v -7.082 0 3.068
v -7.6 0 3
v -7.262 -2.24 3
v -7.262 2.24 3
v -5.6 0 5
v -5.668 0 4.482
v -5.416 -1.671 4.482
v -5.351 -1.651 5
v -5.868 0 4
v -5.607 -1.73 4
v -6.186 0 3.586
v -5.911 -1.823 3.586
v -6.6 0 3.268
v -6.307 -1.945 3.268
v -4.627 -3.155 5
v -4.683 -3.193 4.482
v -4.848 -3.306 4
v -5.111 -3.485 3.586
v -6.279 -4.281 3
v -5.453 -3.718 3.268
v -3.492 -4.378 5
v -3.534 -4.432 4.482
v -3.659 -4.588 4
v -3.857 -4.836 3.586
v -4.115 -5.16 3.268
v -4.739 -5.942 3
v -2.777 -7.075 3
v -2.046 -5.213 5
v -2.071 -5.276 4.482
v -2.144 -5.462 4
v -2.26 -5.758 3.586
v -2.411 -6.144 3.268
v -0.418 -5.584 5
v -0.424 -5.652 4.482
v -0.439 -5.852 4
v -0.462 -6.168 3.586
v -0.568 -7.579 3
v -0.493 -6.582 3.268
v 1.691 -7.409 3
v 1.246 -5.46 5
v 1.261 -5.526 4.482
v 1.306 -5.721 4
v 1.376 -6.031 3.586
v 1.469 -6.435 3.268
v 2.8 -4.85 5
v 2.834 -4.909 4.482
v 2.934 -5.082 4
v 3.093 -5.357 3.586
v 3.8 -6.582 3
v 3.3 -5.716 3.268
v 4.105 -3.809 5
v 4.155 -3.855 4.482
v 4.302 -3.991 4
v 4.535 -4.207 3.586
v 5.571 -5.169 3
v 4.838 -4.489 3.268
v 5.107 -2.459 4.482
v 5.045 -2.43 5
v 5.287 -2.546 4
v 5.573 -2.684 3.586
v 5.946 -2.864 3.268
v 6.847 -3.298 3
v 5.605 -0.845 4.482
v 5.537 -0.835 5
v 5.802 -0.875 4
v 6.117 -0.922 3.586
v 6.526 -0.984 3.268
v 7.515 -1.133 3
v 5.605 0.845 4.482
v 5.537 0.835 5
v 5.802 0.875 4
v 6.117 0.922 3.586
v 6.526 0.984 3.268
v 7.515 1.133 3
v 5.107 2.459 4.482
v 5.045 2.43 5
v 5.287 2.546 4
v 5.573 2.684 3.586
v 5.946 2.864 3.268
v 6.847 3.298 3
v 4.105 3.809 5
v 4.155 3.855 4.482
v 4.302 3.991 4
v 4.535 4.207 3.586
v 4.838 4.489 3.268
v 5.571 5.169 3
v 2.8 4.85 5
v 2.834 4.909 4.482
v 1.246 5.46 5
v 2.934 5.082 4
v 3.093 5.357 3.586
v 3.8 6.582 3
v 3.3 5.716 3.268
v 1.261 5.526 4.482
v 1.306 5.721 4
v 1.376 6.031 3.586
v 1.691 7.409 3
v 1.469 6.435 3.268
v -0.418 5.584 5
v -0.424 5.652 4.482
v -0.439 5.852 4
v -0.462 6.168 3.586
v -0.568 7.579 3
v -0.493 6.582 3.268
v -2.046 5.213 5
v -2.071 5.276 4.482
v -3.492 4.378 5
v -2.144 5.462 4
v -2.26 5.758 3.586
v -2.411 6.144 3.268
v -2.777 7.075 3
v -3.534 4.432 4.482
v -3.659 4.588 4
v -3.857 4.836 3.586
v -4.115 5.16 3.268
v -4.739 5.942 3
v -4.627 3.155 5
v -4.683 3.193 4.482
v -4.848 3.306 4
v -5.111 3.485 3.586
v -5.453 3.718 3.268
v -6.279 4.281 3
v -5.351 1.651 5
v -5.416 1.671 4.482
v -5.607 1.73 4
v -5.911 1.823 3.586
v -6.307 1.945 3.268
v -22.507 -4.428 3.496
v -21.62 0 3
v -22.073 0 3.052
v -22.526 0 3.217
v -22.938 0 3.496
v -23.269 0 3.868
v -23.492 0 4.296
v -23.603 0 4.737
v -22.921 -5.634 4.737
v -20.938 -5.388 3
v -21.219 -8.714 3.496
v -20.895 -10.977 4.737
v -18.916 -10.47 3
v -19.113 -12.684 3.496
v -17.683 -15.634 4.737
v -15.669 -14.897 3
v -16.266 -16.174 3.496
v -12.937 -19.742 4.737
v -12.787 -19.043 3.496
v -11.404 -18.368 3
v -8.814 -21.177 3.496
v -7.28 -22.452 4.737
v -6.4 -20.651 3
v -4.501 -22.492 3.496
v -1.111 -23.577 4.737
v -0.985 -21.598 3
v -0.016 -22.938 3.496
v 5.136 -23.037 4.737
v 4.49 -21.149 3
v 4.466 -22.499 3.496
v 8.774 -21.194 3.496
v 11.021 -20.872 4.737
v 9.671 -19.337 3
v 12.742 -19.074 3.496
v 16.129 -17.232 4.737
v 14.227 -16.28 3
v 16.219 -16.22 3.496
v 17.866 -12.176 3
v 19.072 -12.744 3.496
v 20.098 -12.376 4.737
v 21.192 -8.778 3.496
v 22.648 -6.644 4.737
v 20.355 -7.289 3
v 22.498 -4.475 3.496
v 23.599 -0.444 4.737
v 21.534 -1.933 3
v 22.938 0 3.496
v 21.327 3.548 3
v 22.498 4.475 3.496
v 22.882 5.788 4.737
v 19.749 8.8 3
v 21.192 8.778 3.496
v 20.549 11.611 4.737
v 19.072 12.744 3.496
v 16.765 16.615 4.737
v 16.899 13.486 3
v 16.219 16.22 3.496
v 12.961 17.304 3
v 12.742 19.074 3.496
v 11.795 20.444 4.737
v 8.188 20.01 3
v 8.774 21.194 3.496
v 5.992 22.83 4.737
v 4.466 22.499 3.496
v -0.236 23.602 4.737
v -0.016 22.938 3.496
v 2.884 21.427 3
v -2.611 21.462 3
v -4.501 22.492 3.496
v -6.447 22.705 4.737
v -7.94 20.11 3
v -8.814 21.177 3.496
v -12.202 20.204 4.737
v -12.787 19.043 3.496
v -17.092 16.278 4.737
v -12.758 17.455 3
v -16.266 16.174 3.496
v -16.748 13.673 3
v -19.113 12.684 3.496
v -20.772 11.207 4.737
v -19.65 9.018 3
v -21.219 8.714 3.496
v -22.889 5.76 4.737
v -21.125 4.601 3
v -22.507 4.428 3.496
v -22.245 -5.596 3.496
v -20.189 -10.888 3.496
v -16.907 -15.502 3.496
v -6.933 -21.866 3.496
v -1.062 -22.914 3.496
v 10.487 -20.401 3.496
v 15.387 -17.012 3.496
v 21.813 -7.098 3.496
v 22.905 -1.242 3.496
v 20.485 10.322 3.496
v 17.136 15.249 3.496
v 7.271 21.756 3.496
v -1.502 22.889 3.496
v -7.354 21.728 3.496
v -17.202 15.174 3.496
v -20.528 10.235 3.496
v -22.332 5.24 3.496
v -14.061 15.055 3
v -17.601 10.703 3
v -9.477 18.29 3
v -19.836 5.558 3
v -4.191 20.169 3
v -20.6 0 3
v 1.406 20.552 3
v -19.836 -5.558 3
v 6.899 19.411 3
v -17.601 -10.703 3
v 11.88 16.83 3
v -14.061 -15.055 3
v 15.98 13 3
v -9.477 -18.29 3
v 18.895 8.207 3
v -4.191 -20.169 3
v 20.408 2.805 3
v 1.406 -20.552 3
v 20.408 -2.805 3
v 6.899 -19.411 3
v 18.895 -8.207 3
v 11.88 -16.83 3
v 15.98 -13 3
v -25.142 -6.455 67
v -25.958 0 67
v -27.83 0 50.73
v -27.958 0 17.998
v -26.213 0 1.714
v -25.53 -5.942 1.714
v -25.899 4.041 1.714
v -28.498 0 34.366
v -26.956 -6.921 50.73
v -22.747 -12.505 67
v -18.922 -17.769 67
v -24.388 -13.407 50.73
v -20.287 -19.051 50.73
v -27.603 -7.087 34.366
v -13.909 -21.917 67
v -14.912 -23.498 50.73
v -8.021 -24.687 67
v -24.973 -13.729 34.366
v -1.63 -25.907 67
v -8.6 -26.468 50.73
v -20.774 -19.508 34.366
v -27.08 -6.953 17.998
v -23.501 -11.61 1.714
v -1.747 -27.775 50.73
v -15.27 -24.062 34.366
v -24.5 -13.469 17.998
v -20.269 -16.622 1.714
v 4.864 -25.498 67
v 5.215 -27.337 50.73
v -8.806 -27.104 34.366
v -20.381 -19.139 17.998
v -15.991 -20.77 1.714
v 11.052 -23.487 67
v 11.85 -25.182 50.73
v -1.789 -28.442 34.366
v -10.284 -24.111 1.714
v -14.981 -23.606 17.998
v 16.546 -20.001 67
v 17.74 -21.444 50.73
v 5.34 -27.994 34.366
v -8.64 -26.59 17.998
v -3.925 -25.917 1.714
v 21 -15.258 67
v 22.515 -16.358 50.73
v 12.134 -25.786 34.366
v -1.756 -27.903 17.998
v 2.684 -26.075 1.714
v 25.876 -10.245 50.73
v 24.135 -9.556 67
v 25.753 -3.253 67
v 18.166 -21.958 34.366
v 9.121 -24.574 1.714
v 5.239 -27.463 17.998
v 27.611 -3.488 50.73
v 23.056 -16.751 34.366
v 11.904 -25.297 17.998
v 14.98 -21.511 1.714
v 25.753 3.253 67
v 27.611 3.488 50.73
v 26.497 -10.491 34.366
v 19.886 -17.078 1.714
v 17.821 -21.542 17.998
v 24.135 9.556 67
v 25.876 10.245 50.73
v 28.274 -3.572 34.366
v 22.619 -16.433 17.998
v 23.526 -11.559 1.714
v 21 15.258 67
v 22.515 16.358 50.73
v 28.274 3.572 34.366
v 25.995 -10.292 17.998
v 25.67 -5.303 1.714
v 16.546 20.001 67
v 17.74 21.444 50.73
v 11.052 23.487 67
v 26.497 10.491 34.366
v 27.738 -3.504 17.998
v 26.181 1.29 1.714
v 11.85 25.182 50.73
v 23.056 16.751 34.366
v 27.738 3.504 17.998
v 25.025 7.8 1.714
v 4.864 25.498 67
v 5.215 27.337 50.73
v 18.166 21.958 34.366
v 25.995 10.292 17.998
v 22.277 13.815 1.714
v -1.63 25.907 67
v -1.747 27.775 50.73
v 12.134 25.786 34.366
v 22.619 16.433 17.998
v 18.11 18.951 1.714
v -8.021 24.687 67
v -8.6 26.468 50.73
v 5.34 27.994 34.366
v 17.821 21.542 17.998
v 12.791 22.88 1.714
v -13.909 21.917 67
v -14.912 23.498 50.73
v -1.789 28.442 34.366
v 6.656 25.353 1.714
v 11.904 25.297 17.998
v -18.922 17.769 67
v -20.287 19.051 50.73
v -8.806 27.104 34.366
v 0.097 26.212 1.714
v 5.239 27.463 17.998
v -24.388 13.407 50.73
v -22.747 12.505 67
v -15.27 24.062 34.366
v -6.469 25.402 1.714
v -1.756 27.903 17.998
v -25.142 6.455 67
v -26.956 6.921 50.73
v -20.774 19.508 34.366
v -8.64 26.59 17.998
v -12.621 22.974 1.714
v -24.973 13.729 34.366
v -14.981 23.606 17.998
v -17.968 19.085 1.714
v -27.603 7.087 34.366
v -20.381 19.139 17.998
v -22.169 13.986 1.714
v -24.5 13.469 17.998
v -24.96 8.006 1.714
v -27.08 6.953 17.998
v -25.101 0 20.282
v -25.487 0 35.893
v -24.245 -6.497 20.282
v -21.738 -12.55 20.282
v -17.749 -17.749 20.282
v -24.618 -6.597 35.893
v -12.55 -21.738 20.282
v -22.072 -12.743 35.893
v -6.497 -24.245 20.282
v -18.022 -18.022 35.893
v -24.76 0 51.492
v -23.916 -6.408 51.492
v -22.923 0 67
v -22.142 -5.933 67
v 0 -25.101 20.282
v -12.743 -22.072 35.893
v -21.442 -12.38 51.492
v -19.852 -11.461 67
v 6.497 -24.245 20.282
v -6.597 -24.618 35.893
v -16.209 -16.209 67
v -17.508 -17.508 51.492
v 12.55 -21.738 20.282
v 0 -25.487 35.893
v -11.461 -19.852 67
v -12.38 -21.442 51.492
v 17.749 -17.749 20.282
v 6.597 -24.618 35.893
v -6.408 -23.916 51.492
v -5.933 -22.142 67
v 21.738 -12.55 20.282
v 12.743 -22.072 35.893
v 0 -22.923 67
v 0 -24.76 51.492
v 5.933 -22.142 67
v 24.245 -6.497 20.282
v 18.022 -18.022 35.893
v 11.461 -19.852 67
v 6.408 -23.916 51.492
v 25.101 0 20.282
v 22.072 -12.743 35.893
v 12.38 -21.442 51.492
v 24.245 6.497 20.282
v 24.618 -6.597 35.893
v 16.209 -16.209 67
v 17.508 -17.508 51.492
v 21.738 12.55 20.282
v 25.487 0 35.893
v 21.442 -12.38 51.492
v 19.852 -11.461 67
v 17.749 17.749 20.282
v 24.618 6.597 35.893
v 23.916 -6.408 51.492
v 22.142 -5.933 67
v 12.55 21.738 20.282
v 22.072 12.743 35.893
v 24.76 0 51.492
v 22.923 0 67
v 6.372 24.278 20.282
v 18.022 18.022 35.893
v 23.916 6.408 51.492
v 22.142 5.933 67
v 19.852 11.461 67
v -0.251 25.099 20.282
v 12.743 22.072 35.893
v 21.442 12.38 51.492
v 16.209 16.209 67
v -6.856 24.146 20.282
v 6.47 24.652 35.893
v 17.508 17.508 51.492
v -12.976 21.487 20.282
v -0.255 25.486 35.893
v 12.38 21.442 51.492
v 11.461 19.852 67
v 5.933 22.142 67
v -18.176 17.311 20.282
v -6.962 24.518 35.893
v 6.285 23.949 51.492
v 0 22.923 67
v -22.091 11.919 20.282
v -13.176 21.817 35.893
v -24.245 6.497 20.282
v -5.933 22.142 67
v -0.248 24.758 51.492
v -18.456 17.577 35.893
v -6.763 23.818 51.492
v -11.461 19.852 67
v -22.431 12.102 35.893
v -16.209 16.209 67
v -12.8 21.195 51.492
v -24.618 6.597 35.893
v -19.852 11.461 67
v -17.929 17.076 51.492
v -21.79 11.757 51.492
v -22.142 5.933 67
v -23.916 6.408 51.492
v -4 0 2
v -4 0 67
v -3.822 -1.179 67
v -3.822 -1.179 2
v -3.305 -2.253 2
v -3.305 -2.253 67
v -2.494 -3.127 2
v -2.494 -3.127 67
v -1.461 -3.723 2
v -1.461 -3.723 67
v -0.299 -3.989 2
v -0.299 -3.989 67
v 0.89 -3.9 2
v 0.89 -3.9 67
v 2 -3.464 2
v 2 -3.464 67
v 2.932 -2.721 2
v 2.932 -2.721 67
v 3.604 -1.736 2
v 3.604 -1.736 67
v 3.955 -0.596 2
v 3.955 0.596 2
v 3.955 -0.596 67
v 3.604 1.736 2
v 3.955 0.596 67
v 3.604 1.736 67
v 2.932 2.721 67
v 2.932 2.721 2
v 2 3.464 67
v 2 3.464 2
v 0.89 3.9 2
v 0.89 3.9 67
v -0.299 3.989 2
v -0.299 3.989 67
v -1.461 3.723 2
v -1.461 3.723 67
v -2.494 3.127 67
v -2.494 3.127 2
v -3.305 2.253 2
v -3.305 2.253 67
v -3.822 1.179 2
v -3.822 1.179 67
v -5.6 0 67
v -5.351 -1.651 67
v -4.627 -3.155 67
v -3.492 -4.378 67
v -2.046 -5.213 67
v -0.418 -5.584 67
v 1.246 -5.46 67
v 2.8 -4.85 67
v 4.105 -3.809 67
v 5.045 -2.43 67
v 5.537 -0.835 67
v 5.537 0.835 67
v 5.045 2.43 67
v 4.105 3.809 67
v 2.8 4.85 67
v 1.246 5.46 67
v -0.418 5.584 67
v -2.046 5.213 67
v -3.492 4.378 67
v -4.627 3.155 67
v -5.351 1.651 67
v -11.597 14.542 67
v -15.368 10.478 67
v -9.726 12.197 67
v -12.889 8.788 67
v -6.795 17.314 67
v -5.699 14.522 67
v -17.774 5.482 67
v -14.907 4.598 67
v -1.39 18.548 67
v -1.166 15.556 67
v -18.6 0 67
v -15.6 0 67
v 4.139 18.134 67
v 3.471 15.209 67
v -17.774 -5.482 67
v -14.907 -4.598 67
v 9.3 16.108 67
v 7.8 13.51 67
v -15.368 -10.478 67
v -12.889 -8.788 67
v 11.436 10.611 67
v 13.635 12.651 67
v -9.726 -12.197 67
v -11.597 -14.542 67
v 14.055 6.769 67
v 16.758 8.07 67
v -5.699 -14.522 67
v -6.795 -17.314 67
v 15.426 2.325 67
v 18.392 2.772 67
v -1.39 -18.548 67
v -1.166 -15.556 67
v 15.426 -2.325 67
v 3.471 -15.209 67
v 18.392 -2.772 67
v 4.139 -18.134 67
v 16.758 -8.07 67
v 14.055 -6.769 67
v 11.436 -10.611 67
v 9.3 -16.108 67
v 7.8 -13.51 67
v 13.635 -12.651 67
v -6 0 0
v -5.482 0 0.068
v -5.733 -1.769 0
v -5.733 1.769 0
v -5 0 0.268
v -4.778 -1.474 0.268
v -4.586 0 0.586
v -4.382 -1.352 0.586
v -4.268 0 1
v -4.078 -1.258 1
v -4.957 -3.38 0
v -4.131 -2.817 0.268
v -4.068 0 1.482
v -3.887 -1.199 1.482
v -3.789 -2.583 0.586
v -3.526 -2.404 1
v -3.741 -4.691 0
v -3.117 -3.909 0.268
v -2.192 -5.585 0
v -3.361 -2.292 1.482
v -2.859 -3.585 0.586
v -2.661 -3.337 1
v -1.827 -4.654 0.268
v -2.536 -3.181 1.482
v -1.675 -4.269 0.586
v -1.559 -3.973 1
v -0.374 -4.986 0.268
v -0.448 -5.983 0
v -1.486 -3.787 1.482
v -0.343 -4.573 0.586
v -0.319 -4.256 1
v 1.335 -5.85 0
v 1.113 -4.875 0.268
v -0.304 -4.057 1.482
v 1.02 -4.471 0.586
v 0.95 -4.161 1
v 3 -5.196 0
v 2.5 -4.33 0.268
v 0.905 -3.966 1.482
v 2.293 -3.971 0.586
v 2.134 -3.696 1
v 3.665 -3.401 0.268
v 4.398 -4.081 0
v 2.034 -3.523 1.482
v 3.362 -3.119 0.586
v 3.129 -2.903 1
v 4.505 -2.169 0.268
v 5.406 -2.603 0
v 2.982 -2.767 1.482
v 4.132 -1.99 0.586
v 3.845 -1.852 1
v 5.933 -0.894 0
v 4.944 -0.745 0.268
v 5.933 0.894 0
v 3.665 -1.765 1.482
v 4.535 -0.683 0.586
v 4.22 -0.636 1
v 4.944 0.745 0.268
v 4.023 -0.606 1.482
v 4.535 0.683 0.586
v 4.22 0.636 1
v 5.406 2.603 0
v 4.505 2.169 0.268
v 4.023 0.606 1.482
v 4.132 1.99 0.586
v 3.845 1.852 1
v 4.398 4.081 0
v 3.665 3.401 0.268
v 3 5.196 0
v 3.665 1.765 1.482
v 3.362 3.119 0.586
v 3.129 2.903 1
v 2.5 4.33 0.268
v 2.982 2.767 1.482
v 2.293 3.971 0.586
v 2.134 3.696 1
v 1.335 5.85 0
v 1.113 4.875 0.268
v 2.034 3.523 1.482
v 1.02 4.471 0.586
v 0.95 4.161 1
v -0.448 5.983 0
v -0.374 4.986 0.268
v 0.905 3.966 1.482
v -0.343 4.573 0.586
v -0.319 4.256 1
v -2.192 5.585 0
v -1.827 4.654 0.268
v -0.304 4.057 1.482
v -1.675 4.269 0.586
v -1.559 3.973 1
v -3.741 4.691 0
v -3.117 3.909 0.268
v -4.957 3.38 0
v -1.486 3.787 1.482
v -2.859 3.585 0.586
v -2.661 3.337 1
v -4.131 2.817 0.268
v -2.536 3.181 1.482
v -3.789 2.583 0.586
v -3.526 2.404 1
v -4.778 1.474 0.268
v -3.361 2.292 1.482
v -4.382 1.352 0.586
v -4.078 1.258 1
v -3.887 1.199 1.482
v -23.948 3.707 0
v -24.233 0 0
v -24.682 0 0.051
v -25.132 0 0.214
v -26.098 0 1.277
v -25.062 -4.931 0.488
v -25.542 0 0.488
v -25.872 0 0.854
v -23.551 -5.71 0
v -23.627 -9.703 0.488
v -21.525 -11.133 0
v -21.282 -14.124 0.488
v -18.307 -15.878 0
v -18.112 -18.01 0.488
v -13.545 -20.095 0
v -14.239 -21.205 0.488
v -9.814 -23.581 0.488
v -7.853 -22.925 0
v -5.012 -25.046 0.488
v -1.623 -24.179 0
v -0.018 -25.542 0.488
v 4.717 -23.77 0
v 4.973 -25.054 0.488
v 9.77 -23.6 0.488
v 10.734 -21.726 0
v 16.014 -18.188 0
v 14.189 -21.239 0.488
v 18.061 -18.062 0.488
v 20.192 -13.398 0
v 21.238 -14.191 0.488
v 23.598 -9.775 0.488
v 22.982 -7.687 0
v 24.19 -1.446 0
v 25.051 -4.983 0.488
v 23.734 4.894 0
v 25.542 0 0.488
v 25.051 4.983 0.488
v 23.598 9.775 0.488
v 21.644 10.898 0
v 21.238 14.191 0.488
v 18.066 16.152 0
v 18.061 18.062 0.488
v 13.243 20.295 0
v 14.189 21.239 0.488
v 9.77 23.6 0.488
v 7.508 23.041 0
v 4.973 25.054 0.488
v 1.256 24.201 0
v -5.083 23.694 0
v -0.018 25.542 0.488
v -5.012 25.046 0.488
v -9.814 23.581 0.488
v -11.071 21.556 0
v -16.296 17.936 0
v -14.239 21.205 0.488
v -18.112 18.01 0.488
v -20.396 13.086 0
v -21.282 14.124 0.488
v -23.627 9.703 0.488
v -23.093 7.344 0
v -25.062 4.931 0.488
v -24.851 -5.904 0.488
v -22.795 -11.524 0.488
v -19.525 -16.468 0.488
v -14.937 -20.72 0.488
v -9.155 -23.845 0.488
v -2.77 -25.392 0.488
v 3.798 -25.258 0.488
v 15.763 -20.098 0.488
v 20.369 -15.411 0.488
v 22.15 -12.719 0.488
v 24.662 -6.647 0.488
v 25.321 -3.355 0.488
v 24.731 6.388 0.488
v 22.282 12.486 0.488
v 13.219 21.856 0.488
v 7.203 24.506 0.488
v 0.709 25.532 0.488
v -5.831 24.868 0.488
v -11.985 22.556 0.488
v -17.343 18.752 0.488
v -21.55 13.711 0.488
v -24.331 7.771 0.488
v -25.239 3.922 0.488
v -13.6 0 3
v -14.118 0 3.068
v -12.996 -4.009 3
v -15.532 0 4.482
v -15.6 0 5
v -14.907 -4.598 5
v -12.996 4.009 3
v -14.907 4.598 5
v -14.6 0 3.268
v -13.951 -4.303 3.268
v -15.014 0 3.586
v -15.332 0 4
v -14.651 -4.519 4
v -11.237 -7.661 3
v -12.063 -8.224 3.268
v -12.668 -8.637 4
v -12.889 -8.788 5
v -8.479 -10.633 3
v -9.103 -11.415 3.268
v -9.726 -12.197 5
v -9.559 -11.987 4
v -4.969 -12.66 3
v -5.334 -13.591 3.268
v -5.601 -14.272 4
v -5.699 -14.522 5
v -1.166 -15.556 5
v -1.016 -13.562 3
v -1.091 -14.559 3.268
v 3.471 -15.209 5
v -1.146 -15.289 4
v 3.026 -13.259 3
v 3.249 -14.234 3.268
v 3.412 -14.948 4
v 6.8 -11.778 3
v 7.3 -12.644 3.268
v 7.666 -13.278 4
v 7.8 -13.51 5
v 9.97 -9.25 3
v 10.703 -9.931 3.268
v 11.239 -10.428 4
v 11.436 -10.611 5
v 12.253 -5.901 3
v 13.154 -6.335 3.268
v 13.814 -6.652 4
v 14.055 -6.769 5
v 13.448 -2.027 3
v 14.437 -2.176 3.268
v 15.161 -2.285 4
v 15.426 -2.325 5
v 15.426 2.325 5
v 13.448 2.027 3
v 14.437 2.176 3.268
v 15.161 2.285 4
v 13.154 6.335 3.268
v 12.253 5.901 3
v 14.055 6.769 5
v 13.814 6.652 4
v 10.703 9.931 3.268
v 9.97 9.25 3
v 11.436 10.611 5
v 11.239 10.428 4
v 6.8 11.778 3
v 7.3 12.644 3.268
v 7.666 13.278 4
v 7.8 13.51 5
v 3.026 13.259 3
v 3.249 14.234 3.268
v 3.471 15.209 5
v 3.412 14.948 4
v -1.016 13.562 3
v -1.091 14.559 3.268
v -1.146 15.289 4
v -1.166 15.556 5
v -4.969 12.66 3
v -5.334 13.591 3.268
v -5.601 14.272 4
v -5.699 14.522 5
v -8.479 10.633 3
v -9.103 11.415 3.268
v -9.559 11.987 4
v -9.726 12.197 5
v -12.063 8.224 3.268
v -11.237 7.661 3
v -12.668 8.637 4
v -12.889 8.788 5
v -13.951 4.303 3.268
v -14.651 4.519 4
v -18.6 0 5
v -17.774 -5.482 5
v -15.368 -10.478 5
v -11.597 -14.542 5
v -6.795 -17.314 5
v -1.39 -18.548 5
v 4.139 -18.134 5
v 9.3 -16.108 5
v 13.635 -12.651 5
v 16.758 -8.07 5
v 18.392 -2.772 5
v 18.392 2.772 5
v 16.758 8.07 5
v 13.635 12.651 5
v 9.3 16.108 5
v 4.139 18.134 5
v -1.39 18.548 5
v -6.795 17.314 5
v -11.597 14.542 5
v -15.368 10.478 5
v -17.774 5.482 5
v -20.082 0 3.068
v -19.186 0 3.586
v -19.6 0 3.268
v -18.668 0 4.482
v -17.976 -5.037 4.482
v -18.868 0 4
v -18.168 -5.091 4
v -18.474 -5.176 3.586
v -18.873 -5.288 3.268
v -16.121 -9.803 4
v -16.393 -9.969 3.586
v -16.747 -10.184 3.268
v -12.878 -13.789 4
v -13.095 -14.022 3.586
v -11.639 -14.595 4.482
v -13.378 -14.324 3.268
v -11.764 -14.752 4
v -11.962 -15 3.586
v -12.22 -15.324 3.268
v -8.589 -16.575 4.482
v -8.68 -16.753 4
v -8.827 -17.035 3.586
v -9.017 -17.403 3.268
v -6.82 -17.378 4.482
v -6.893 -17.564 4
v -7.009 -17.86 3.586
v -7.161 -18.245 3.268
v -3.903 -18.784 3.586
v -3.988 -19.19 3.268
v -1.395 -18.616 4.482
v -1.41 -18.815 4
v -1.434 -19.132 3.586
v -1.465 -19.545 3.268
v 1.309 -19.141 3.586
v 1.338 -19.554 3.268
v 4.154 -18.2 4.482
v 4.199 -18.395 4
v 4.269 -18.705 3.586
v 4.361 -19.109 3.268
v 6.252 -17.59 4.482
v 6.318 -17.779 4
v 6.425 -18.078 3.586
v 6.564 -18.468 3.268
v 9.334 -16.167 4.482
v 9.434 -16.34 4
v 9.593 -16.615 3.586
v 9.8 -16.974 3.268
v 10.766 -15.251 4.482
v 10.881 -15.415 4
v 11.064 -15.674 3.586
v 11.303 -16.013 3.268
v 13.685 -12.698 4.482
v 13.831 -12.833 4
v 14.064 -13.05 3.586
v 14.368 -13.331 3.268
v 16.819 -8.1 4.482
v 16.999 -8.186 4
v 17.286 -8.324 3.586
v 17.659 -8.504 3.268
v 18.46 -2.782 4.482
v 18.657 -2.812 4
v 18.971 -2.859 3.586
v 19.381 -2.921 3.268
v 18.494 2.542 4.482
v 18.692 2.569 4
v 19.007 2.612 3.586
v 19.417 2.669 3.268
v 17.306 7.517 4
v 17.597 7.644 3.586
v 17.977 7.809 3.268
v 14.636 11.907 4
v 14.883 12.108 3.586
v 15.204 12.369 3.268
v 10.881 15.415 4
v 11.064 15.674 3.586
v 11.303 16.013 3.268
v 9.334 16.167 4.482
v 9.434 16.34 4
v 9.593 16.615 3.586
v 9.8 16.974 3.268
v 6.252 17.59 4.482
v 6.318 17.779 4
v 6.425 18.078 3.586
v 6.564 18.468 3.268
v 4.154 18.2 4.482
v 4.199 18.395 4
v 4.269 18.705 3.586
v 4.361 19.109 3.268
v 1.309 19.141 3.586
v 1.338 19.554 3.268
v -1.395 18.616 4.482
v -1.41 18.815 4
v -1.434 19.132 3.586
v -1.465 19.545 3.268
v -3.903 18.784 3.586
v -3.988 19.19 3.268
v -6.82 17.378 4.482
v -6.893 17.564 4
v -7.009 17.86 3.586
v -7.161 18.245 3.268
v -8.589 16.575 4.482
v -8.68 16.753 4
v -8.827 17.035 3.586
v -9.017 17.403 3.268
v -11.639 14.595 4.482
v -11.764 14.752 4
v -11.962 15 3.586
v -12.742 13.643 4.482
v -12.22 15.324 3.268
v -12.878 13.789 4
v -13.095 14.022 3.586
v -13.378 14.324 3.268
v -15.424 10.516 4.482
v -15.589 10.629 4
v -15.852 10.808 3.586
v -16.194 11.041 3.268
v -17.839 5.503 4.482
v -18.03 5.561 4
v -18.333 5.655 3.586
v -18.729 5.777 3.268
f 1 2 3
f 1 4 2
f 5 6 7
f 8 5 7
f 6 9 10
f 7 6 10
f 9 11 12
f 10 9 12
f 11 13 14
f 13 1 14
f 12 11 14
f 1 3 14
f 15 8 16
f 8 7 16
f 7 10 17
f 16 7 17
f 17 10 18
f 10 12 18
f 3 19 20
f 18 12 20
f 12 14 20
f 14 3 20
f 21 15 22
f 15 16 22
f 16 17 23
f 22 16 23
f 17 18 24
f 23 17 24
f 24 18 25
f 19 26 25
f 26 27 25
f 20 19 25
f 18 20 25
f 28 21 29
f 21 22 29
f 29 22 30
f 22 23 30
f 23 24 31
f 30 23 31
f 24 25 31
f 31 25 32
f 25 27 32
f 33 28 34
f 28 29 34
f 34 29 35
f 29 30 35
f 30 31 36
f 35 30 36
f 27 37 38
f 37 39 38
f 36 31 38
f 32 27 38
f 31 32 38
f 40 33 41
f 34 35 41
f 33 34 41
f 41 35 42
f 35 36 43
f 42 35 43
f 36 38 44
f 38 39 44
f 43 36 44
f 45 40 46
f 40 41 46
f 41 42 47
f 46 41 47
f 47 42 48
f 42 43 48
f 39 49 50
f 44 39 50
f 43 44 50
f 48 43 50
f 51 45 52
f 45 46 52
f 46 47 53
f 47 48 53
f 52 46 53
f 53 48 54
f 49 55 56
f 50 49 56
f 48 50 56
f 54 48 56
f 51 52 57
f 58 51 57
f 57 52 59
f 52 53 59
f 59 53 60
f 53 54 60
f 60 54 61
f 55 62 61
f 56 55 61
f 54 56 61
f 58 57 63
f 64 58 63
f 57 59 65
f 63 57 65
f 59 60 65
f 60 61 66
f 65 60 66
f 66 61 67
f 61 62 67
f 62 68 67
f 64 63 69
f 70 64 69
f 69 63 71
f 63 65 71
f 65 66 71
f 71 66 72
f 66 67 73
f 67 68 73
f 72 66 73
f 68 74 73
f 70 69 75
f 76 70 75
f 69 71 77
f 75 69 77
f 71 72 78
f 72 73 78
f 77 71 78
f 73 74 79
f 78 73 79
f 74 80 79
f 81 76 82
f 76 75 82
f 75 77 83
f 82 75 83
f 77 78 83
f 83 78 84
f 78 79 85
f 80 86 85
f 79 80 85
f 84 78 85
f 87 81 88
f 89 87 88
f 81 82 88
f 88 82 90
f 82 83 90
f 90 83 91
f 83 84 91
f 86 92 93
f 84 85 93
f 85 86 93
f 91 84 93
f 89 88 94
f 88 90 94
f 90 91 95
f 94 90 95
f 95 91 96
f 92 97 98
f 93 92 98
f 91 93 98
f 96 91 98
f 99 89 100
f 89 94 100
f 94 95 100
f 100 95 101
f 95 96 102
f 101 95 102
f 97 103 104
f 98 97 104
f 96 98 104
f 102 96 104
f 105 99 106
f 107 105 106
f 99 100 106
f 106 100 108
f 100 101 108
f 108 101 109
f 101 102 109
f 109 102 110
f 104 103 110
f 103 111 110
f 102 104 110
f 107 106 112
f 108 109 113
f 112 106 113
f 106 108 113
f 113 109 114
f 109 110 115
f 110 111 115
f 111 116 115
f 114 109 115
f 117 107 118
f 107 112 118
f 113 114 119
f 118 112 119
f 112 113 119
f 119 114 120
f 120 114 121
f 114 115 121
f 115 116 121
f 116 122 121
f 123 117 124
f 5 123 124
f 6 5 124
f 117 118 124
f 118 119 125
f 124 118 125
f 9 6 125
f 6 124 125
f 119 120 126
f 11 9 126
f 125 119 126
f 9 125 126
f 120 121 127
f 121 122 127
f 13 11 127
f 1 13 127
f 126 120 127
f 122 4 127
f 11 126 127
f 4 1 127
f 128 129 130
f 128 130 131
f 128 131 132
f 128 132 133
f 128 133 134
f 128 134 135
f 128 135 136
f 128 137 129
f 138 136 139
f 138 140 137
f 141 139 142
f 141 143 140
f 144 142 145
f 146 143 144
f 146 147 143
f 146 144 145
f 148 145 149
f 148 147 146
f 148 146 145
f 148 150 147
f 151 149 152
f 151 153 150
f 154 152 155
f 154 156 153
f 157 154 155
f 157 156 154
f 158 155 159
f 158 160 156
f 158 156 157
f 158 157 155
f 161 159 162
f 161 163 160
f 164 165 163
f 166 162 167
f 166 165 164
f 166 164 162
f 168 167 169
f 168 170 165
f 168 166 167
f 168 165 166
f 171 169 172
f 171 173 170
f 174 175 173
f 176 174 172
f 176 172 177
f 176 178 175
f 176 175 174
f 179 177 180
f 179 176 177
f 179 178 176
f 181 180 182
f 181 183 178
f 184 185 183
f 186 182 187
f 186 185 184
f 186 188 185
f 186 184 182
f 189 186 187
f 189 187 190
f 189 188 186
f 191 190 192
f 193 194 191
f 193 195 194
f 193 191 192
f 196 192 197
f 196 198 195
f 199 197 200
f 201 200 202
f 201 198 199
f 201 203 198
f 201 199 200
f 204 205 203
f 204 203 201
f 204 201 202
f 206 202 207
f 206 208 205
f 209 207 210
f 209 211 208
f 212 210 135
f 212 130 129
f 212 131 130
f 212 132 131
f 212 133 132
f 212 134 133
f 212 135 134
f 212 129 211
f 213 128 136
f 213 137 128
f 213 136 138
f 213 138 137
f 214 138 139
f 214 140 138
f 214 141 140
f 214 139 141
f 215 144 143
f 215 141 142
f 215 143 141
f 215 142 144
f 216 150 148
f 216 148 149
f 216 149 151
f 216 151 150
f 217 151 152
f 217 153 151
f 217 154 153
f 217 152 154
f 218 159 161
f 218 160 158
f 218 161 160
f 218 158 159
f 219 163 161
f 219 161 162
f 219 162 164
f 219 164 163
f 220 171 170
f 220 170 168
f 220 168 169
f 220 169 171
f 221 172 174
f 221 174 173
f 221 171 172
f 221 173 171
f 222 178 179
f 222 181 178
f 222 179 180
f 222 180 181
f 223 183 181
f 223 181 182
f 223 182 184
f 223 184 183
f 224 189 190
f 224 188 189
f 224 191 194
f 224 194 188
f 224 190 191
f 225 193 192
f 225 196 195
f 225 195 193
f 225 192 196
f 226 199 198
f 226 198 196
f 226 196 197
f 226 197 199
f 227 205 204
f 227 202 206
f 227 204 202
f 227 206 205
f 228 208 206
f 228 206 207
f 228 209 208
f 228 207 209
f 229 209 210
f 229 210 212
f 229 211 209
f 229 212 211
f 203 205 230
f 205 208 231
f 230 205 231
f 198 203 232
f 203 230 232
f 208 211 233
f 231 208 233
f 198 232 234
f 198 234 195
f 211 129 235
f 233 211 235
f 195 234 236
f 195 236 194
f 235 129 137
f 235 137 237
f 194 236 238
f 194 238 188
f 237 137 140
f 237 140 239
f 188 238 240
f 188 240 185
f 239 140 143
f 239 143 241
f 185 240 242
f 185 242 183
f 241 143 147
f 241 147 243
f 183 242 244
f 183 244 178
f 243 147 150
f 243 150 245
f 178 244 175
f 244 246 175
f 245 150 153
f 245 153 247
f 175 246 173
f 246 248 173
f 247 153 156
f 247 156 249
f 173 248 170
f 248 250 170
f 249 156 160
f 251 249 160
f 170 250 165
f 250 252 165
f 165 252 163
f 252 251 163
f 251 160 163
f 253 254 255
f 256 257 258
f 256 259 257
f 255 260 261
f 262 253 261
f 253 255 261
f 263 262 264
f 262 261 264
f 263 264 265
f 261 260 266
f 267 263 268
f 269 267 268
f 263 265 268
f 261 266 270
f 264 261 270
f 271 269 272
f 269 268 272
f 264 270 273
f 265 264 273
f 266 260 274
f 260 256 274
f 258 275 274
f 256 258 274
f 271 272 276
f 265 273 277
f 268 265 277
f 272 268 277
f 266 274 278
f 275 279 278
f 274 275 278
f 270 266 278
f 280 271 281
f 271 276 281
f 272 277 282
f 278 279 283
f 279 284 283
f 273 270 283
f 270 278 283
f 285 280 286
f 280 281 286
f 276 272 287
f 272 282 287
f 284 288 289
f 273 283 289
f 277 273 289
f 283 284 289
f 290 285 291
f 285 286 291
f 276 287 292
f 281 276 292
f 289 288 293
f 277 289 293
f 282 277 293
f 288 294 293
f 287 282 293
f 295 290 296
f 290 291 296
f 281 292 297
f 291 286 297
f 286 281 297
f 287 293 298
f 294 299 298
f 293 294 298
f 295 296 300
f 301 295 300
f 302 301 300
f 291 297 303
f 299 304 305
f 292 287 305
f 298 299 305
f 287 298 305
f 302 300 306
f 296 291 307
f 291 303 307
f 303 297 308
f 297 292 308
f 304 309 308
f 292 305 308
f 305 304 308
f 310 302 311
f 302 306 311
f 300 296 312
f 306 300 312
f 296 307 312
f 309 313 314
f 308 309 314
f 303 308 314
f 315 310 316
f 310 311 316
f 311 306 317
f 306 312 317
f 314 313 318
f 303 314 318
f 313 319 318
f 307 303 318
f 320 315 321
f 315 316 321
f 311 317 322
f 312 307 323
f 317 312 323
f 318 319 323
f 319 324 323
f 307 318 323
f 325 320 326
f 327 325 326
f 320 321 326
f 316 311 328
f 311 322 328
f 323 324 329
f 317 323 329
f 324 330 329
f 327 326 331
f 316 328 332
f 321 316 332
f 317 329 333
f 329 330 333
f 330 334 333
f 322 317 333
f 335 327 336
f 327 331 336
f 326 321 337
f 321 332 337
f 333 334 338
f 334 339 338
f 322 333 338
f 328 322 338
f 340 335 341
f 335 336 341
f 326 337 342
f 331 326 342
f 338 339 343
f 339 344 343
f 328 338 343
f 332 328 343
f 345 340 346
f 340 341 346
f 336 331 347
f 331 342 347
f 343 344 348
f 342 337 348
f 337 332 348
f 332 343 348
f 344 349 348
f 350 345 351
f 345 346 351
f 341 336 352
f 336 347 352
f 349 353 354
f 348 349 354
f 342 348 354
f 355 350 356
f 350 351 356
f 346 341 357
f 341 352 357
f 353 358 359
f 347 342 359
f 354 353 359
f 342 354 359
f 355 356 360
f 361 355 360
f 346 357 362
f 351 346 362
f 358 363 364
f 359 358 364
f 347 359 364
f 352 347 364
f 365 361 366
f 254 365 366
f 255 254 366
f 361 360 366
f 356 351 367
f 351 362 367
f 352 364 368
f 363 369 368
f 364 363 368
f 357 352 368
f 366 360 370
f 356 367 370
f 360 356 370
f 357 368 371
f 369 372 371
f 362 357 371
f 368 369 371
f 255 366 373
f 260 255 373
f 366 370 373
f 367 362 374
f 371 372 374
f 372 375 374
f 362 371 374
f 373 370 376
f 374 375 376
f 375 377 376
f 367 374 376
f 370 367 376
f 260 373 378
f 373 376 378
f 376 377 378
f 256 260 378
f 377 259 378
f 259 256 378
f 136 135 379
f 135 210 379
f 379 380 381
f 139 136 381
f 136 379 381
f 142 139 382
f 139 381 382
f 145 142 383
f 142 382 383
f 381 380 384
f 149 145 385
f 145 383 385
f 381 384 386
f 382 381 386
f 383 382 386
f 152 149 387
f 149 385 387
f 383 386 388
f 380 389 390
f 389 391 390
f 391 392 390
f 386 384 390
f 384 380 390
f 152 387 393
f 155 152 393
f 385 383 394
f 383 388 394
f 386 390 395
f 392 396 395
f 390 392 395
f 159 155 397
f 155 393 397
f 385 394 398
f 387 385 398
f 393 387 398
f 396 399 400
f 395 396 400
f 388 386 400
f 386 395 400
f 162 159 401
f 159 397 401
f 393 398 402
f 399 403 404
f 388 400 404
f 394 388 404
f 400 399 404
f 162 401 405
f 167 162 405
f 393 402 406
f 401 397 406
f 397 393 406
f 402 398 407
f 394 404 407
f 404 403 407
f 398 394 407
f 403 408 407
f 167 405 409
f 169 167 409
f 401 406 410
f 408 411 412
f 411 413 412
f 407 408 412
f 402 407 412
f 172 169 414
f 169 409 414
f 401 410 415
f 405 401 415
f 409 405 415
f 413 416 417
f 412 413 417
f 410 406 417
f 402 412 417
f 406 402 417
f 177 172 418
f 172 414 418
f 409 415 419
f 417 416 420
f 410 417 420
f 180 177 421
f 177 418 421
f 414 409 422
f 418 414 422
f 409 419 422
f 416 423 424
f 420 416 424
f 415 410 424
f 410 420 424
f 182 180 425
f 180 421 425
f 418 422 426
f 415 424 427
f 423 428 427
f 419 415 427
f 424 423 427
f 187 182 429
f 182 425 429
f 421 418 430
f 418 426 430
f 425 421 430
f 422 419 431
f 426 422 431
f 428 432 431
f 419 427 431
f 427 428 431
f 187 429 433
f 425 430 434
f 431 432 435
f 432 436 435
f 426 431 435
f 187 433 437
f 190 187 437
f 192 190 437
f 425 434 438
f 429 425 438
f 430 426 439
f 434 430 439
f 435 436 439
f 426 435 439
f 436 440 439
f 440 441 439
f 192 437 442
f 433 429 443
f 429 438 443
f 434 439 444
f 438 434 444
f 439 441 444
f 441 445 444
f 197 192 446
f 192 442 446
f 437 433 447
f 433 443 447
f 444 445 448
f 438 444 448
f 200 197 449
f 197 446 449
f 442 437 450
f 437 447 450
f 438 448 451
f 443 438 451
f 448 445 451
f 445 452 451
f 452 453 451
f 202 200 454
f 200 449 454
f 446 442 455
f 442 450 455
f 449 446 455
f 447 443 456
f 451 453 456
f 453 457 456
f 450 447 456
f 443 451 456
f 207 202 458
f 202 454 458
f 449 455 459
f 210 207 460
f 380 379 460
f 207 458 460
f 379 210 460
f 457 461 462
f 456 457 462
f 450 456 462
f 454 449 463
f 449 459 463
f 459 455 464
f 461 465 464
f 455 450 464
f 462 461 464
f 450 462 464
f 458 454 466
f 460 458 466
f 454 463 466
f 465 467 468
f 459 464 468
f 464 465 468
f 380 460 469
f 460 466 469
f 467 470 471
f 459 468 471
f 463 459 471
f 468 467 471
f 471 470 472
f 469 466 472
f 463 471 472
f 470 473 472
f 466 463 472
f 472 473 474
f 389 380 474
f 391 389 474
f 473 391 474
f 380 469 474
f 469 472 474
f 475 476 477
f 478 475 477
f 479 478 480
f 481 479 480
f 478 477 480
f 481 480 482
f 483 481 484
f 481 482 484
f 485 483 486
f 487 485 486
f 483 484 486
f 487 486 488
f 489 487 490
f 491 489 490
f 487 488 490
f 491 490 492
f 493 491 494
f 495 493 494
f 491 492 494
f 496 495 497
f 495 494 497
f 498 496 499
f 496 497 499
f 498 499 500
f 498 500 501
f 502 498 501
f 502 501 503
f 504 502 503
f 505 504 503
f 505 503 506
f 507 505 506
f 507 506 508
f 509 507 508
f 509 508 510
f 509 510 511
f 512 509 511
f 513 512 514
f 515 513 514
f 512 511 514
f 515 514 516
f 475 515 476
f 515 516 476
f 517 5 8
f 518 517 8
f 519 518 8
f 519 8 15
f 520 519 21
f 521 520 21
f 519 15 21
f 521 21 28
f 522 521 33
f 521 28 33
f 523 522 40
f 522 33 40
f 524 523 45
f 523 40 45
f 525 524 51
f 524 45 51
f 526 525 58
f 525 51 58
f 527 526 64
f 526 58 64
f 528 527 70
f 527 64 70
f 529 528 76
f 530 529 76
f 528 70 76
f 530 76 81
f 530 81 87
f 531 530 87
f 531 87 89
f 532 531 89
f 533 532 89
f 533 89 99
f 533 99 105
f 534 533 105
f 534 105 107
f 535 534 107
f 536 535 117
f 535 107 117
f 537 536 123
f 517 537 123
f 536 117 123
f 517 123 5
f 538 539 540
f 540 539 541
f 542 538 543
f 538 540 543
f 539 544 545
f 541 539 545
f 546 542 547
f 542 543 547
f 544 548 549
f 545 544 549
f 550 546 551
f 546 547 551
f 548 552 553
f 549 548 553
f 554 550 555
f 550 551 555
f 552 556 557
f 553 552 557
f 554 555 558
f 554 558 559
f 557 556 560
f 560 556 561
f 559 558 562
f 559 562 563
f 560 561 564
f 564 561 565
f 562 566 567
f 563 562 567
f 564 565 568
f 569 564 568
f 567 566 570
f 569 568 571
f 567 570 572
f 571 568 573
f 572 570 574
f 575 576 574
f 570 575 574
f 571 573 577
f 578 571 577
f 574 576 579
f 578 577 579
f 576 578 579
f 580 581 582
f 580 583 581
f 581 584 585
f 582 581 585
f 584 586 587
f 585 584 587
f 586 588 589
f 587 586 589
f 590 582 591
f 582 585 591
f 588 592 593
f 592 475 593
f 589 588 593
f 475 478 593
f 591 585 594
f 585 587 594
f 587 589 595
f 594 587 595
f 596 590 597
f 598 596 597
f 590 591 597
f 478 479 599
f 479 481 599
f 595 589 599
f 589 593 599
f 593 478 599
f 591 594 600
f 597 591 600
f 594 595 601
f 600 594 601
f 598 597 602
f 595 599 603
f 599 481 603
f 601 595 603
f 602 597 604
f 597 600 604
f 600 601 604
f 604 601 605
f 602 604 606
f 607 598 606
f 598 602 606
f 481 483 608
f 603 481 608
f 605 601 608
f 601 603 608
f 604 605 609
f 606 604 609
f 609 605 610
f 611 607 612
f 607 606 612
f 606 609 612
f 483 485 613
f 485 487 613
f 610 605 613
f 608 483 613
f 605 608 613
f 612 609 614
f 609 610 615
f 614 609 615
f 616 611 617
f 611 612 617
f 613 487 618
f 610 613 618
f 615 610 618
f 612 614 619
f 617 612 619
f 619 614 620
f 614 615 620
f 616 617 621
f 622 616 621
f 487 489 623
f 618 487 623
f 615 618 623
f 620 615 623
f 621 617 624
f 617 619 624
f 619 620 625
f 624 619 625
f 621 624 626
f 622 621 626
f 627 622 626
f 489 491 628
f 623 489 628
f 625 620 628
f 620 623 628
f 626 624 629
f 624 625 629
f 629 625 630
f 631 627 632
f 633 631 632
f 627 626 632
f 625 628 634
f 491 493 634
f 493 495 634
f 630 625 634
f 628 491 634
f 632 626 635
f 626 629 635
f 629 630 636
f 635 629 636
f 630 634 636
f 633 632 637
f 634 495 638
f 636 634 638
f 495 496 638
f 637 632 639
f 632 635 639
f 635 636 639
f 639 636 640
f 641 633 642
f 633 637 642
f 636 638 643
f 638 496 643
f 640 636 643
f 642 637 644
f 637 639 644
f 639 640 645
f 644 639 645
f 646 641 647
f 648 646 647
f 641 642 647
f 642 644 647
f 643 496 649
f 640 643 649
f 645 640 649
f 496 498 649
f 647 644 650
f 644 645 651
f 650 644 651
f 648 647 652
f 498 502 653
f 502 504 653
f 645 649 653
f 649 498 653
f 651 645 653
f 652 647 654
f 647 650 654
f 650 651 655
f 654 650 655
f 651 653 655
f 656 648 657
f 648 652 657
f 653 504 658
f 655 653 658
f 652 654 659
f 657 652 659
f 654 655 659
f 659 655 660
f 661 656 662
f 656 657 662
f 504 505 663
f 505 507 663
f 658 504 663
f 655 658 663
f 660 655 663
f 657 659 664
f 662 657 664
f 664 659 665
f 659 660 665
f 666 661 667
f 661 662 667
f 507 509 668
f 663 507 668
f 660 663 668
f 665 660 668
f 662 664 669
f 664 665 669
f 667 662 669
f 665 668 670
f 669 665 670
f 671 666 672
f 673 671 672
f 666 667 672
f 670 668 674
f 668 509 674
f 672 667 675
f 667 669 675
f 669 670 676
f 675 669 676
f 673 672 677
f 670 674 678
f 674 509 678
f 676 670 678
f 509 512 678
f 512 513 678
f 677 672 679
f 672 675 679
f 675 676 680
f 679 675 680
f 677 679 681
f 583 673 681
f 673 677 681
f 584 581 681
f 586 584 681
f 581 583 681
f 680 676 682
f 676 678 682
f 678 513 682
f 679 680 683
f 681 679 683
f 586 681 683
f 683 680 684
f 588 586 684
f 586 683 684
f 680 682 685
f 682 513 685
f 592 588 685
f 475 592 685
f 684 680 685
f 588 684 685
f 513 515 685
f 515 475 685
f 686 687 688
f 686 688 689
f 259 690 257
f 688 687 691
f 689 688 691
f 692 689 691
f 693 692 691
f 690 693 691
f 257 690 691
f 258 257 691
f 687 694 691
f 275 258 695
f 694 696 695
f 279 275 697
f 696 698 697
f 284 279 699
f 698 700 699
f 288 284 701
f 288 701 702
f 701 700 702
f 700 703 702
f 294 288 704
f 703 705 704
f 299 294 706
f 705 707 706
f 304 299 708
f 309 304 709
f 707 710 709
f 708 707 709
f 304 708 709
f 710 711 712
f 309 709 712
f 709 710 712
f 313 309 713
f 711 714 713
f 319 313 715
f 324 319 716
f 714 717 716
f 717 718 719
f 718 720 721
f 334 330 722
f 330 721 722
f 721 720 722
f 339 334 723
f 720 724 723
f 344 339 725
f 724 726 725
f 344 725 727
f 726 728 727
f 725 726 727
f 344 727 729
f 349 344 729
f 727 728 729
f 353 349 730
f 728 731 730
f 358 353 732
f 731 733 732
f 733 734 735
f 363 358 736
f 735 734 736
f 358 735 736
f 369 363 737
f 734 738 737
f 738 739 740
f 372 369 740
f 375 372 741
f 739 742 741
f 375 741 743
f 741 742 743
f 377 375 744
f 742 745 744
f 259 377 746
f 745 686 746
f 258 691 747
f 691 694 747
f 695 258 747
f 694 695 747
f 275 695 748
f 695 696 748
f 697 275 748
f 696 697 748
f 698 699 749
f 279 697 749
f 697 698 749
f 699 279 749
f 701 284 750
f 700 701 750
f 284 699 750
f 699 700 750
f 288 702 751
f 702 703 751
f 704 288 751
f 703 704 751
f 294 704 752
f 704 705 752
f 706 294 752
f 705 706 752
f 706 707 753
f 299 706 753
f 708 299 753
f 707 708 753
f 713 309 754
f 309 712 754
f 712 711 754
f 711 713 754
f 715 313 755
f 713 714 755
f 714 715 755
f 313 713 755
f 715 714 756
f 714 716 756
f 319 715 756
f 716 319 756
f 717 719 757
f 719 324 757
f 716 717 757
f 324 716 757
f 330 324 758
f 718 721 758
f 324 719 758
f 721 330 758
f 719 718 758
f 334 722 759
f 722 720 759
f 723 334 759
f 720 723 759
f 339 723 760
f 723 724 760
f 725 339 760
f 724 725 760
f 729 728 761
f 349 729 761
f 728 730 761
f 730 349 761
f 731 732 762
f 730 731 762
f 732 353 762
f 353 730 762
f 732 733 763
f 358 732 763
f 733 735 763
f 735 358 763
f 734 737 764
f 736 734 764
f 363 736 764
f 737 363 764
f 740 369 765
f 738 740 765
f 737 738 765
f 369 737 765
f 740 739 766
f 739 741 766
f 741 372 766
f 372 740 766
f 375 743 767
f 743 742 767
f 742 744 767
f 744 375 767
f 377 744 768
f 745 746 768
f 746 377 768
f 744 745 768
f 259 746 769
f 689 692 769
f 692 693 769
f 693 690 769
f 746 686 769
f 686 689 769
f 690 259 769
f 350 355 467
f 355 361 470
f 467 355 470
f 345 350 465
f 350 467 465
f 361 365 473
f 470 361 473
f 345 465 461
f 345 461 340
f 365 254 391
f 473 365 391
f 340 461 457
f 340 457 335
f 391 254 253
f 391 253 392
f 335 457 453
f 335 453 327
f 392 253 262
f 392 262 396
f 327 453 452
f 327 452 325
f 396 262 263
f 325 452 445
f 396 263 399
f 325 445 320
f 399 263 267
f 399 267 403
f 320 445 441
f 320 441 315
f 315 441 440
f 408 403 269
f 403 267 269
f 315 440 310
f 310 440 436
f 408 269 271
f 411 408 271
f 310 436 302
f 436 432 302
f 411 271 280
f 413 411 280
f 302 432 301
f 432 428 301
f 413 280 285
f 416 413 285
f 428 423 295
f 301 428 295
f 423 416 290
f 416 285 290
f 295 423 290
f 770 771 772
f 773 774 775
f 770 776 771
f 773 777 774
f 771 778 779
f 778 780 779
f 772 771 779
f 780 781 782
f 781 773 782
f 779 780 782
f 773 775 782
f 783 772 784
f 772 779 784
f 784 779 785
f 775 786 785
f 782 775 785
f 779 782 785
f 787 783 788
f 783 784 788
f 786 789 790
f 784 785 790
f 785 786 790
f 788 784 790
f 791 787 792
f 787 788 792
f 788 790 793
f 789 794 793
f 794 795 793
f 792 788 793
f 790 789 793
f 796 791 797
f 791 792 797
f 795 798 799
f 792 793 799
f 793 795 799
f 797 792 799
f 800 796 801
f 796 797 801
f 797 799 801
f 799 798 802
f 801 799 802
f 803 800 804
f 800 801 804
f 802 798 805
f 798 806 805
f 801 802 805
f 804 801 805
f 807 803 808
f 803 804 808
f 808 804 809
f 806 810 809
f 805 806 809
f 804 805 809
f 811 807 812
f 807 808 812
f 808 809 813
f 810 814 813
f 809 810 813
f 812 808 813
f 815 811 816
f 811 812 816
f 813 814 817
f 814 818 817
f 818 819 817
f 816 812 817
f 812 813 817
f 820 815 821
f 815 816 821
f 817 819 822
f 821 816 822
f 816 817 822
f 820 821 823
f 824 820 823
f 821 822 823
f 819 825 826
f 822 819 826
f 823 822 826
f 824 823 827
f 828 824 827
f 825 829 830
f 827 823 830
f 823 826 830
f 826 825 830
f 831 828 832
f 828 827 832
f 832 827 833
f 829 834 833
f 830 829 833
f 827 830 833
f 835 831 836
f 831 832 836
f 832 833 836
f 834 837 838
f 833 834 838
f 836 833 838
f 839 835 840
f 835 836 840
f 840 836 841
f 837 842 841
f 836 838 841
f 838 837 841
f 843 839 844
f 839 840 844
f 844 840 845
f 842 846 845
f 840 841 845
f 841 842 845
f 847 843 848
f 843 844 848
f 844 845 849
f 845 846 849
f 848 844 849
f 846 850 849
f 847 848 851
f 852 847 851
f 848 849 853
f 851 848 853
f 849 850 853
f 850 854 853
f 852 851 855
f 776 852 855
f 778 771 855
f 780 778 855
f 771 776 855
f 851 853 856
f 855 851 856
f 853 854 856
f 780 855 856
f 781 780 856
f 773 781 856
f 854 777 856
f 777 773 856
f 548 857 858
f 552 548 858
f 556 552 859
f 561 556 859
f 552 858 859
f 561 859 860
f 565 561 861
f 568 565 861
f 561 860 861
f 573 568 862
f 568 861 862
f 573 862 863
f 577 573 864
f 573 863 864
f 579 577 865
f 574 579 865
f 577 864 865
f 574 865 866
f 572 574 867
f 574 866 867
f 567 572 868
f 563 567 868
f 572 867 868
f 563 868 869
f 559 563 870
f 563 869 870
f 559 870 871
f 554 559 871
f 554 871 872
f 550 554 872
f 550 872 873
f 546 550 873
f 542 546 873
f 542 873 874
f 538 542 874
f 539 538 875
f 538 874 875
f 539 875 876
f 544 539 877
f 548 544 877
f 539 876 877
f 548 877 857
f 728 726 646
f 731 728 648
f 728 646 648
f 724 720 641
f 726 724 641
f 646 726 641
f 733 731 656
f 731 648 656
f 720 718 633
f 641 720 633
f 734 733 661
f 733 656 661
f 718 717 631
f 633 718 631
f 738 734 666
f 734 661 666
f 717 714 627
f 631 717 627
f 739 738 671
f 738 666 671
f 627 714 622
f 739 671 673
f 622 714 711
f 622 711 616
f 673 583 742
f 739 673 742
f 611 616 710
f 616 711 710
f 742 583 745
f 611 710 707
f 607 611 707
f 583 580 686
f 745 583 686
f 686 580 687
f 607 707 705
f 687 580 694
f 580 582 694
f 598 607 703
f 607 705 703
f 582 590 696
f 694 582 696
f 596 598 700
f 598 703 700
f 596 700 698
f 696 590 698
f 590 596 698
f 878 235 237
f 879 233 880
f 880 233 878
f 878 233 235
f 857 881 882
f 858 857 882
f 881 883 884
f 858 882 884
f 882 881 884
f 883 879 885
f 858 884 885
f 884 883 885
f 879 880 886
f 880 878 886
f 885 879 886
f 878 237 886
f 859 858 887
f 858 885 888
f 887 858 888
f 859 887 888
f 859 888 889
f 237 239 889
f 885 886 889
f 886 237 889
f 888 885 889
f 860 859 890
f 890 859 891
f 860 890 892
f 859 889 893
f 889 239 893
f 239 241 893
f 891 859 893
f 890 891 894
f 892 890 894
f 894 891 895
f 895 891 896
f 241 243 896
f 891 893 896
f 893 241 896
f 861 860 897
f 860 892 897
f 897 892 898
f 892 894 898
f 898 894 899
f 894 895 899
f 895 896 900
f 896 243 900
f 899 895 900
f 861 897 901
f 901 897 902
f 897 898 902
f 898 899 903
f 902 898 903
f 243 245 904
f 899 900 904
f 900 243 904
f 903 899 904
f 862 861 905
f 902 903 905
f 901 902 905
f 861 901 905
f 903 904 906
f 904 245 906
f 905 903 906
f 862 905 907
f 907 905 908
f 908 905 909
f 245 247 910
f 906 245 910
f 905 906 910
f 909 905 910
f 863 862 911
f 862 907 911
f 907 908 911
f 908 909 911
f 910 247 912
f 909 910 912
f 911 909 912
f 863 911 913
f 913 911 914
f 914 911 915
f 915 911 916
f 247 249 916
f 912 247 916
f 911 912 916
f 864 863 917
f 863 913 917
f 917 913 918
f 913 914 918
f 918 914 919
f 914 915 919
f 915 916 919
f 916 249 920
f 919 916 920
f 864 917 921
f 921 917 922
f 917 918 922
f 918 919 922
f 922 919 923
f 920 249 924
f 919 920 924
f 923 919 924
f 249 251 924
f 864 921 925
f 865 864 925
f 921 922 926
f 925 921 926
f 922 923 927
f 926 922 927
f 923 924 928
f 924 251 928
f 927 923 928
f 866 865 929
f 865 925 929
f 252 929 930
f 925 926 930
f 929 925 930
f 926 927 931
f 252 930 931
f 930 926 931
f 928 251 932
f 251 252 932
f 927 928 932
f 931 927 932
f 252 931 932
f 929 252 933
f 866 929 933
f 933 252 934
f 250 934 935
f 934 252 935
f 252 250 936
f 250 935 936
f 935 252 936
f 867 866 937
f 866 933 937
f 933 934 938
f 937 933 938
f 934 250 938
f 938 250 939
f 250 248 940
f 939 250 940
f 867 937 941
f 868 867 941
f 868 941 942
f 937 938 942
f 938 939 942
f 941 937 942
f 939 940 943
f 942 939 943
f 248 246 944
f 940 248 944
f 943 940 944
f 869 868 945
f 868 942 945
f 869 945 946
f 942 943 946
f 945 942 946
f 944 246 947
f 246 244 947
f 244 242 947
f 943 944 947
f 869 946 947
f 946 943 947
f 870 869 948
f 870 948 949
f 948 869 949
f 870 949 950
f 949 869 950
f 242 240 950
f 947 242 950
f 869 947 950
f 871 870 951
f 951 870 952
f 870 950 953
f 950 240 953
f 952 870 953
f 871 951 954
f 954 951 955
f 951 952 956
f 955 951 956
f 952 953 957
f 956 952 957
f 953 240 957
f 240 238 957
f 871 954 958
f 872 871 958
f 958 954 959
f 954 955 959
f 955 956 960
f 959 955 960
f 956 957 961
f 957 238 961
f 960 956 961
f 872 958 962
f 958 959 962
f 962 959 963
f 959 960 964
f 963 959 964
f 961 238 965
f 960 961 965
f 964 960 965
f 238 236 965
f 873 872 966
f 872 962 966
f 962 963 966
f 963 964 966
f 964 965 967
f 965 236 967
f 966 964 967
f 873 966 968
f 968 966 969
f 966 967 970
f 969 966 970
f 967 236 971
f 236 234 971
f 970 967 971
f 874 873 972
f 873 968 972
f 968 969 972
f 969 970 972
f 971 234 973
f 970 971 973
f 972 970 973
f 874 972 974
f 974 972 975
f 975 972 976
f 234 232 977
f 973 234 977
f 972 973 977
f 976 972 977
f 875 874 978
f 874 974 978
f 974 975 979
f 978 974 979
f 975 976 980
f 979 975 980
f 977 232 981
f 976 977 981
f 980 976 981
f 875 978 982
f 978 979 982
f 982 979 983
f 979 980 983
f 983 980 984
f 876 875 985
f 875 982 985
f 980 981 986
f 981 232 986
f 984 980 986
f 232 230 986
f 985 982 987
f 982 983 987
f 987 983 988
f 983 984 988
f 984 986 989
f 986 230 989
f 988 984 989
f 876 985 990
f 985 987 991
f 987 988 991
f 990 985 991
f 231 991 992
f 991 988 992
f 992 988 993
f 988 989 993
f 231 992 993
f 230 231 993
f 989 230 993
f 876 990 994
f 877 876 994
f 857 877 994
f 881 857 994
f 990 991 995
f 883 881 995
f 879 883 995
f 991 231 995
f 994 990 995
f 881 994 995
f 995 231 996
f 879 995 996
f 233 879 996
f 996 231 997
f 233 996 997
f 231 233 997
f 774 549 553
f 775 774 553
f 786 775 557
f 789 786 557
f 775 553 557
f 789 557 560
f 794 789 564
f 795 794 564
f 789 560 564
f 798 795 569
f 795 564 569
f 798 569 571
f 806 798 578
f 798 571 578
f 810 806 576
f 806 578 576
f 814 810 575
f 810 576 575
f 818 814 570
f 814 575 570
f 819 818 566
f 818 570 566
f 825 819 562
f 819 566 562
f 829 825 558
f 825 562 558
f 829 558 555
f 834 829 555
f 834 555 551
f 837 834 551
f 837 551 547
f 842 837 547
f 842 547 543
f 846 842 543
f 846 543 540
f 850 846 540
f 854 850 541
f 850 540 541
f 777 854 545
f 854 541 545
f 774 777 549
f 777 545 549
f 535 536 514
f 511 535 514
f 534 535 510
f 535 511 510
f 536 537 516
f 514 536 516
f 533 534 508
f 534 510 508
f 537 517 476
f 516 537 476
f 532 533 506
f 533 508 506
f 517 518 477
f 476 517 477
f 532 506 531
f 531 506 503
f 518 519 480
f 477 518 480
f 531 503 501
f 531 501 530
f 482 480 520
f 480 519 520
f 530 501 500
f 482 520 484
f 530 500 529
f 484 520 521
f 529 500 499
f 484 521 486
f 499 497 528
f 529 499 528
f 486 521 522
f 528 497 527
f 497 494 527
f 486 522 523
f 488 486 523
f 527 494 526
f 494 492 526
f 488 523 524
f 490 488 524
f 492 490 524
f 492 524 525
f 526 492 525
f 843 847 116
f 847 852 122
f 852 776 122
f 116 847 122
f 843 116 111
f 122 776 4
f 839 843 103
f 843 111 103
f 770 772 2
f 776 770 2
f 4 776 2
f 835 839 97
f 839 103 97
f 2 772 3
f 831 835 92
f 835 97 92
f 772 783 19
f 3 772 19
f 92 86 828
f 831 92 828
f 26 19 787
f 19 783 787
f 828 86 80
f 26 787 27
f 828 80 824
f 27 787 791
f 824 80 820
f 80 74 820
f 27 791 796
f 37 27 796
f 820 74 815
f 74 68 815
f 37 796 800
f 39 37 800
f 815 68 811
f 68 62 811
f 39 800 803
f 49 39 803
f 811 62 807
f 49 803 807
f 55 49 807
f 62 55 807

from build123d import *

# Parameters (mm, degrees)
F2_R = 2


# Not quite as in the source:
# - two fillets or chamfers of one size are made in one step
# - a feature names something its author has since deleted; it is built from what else it names


with BuildPart() as f1:
    # F0 (on Front) → F1 (revolve)
    with BuildSketch(Plane.XZ):
        with BuildLine():
            Line((-25.9578547239, 0), (-4, 0))
            Line((-4, 0), (-4, 67))
            Line((-4, 67), (-5.6, 67))
            Line((-5.6, 67), (-5.6, 3))
            Line((-5.6, 3), (-15.6, 3))
            Line((-15.6, 3), (-15.6, 67))
            Line((-15.6, 67), (-18.6, 67))
            Line((-18.6, 67), (-18.6, 3))
            Line((-18.6, 3), (-23.3657418773, 3))
            ThreePointArc((-23.3657418773, 3), (-25.4947508744, 35.0162748691), (-22.9226189658, 67))
            Line((-22.9226189658, 67), (-25.9578547239, 67))
            ThreePointArc((-25.9578547239, 67), (-28.5, 33.5), (-25.9578547239, 0))
        make_face()
    revolve(axis=Axis((0, 0, 33.5), (0, 0, 1)))

    # F2
    f2_edges = [f1.edges().sort_by_distance(p)[0] for p in [
        (15.6, 0, 3),
        (23.365742, 0, 3),
        (18.6, 0, 3),
        (4, 0, 0),
        (25.957855, 0, 0),
        (5.6, 0, 3),
    ]]
    fillet(f2_edges, radius=F2_R)


solid = f1.part
